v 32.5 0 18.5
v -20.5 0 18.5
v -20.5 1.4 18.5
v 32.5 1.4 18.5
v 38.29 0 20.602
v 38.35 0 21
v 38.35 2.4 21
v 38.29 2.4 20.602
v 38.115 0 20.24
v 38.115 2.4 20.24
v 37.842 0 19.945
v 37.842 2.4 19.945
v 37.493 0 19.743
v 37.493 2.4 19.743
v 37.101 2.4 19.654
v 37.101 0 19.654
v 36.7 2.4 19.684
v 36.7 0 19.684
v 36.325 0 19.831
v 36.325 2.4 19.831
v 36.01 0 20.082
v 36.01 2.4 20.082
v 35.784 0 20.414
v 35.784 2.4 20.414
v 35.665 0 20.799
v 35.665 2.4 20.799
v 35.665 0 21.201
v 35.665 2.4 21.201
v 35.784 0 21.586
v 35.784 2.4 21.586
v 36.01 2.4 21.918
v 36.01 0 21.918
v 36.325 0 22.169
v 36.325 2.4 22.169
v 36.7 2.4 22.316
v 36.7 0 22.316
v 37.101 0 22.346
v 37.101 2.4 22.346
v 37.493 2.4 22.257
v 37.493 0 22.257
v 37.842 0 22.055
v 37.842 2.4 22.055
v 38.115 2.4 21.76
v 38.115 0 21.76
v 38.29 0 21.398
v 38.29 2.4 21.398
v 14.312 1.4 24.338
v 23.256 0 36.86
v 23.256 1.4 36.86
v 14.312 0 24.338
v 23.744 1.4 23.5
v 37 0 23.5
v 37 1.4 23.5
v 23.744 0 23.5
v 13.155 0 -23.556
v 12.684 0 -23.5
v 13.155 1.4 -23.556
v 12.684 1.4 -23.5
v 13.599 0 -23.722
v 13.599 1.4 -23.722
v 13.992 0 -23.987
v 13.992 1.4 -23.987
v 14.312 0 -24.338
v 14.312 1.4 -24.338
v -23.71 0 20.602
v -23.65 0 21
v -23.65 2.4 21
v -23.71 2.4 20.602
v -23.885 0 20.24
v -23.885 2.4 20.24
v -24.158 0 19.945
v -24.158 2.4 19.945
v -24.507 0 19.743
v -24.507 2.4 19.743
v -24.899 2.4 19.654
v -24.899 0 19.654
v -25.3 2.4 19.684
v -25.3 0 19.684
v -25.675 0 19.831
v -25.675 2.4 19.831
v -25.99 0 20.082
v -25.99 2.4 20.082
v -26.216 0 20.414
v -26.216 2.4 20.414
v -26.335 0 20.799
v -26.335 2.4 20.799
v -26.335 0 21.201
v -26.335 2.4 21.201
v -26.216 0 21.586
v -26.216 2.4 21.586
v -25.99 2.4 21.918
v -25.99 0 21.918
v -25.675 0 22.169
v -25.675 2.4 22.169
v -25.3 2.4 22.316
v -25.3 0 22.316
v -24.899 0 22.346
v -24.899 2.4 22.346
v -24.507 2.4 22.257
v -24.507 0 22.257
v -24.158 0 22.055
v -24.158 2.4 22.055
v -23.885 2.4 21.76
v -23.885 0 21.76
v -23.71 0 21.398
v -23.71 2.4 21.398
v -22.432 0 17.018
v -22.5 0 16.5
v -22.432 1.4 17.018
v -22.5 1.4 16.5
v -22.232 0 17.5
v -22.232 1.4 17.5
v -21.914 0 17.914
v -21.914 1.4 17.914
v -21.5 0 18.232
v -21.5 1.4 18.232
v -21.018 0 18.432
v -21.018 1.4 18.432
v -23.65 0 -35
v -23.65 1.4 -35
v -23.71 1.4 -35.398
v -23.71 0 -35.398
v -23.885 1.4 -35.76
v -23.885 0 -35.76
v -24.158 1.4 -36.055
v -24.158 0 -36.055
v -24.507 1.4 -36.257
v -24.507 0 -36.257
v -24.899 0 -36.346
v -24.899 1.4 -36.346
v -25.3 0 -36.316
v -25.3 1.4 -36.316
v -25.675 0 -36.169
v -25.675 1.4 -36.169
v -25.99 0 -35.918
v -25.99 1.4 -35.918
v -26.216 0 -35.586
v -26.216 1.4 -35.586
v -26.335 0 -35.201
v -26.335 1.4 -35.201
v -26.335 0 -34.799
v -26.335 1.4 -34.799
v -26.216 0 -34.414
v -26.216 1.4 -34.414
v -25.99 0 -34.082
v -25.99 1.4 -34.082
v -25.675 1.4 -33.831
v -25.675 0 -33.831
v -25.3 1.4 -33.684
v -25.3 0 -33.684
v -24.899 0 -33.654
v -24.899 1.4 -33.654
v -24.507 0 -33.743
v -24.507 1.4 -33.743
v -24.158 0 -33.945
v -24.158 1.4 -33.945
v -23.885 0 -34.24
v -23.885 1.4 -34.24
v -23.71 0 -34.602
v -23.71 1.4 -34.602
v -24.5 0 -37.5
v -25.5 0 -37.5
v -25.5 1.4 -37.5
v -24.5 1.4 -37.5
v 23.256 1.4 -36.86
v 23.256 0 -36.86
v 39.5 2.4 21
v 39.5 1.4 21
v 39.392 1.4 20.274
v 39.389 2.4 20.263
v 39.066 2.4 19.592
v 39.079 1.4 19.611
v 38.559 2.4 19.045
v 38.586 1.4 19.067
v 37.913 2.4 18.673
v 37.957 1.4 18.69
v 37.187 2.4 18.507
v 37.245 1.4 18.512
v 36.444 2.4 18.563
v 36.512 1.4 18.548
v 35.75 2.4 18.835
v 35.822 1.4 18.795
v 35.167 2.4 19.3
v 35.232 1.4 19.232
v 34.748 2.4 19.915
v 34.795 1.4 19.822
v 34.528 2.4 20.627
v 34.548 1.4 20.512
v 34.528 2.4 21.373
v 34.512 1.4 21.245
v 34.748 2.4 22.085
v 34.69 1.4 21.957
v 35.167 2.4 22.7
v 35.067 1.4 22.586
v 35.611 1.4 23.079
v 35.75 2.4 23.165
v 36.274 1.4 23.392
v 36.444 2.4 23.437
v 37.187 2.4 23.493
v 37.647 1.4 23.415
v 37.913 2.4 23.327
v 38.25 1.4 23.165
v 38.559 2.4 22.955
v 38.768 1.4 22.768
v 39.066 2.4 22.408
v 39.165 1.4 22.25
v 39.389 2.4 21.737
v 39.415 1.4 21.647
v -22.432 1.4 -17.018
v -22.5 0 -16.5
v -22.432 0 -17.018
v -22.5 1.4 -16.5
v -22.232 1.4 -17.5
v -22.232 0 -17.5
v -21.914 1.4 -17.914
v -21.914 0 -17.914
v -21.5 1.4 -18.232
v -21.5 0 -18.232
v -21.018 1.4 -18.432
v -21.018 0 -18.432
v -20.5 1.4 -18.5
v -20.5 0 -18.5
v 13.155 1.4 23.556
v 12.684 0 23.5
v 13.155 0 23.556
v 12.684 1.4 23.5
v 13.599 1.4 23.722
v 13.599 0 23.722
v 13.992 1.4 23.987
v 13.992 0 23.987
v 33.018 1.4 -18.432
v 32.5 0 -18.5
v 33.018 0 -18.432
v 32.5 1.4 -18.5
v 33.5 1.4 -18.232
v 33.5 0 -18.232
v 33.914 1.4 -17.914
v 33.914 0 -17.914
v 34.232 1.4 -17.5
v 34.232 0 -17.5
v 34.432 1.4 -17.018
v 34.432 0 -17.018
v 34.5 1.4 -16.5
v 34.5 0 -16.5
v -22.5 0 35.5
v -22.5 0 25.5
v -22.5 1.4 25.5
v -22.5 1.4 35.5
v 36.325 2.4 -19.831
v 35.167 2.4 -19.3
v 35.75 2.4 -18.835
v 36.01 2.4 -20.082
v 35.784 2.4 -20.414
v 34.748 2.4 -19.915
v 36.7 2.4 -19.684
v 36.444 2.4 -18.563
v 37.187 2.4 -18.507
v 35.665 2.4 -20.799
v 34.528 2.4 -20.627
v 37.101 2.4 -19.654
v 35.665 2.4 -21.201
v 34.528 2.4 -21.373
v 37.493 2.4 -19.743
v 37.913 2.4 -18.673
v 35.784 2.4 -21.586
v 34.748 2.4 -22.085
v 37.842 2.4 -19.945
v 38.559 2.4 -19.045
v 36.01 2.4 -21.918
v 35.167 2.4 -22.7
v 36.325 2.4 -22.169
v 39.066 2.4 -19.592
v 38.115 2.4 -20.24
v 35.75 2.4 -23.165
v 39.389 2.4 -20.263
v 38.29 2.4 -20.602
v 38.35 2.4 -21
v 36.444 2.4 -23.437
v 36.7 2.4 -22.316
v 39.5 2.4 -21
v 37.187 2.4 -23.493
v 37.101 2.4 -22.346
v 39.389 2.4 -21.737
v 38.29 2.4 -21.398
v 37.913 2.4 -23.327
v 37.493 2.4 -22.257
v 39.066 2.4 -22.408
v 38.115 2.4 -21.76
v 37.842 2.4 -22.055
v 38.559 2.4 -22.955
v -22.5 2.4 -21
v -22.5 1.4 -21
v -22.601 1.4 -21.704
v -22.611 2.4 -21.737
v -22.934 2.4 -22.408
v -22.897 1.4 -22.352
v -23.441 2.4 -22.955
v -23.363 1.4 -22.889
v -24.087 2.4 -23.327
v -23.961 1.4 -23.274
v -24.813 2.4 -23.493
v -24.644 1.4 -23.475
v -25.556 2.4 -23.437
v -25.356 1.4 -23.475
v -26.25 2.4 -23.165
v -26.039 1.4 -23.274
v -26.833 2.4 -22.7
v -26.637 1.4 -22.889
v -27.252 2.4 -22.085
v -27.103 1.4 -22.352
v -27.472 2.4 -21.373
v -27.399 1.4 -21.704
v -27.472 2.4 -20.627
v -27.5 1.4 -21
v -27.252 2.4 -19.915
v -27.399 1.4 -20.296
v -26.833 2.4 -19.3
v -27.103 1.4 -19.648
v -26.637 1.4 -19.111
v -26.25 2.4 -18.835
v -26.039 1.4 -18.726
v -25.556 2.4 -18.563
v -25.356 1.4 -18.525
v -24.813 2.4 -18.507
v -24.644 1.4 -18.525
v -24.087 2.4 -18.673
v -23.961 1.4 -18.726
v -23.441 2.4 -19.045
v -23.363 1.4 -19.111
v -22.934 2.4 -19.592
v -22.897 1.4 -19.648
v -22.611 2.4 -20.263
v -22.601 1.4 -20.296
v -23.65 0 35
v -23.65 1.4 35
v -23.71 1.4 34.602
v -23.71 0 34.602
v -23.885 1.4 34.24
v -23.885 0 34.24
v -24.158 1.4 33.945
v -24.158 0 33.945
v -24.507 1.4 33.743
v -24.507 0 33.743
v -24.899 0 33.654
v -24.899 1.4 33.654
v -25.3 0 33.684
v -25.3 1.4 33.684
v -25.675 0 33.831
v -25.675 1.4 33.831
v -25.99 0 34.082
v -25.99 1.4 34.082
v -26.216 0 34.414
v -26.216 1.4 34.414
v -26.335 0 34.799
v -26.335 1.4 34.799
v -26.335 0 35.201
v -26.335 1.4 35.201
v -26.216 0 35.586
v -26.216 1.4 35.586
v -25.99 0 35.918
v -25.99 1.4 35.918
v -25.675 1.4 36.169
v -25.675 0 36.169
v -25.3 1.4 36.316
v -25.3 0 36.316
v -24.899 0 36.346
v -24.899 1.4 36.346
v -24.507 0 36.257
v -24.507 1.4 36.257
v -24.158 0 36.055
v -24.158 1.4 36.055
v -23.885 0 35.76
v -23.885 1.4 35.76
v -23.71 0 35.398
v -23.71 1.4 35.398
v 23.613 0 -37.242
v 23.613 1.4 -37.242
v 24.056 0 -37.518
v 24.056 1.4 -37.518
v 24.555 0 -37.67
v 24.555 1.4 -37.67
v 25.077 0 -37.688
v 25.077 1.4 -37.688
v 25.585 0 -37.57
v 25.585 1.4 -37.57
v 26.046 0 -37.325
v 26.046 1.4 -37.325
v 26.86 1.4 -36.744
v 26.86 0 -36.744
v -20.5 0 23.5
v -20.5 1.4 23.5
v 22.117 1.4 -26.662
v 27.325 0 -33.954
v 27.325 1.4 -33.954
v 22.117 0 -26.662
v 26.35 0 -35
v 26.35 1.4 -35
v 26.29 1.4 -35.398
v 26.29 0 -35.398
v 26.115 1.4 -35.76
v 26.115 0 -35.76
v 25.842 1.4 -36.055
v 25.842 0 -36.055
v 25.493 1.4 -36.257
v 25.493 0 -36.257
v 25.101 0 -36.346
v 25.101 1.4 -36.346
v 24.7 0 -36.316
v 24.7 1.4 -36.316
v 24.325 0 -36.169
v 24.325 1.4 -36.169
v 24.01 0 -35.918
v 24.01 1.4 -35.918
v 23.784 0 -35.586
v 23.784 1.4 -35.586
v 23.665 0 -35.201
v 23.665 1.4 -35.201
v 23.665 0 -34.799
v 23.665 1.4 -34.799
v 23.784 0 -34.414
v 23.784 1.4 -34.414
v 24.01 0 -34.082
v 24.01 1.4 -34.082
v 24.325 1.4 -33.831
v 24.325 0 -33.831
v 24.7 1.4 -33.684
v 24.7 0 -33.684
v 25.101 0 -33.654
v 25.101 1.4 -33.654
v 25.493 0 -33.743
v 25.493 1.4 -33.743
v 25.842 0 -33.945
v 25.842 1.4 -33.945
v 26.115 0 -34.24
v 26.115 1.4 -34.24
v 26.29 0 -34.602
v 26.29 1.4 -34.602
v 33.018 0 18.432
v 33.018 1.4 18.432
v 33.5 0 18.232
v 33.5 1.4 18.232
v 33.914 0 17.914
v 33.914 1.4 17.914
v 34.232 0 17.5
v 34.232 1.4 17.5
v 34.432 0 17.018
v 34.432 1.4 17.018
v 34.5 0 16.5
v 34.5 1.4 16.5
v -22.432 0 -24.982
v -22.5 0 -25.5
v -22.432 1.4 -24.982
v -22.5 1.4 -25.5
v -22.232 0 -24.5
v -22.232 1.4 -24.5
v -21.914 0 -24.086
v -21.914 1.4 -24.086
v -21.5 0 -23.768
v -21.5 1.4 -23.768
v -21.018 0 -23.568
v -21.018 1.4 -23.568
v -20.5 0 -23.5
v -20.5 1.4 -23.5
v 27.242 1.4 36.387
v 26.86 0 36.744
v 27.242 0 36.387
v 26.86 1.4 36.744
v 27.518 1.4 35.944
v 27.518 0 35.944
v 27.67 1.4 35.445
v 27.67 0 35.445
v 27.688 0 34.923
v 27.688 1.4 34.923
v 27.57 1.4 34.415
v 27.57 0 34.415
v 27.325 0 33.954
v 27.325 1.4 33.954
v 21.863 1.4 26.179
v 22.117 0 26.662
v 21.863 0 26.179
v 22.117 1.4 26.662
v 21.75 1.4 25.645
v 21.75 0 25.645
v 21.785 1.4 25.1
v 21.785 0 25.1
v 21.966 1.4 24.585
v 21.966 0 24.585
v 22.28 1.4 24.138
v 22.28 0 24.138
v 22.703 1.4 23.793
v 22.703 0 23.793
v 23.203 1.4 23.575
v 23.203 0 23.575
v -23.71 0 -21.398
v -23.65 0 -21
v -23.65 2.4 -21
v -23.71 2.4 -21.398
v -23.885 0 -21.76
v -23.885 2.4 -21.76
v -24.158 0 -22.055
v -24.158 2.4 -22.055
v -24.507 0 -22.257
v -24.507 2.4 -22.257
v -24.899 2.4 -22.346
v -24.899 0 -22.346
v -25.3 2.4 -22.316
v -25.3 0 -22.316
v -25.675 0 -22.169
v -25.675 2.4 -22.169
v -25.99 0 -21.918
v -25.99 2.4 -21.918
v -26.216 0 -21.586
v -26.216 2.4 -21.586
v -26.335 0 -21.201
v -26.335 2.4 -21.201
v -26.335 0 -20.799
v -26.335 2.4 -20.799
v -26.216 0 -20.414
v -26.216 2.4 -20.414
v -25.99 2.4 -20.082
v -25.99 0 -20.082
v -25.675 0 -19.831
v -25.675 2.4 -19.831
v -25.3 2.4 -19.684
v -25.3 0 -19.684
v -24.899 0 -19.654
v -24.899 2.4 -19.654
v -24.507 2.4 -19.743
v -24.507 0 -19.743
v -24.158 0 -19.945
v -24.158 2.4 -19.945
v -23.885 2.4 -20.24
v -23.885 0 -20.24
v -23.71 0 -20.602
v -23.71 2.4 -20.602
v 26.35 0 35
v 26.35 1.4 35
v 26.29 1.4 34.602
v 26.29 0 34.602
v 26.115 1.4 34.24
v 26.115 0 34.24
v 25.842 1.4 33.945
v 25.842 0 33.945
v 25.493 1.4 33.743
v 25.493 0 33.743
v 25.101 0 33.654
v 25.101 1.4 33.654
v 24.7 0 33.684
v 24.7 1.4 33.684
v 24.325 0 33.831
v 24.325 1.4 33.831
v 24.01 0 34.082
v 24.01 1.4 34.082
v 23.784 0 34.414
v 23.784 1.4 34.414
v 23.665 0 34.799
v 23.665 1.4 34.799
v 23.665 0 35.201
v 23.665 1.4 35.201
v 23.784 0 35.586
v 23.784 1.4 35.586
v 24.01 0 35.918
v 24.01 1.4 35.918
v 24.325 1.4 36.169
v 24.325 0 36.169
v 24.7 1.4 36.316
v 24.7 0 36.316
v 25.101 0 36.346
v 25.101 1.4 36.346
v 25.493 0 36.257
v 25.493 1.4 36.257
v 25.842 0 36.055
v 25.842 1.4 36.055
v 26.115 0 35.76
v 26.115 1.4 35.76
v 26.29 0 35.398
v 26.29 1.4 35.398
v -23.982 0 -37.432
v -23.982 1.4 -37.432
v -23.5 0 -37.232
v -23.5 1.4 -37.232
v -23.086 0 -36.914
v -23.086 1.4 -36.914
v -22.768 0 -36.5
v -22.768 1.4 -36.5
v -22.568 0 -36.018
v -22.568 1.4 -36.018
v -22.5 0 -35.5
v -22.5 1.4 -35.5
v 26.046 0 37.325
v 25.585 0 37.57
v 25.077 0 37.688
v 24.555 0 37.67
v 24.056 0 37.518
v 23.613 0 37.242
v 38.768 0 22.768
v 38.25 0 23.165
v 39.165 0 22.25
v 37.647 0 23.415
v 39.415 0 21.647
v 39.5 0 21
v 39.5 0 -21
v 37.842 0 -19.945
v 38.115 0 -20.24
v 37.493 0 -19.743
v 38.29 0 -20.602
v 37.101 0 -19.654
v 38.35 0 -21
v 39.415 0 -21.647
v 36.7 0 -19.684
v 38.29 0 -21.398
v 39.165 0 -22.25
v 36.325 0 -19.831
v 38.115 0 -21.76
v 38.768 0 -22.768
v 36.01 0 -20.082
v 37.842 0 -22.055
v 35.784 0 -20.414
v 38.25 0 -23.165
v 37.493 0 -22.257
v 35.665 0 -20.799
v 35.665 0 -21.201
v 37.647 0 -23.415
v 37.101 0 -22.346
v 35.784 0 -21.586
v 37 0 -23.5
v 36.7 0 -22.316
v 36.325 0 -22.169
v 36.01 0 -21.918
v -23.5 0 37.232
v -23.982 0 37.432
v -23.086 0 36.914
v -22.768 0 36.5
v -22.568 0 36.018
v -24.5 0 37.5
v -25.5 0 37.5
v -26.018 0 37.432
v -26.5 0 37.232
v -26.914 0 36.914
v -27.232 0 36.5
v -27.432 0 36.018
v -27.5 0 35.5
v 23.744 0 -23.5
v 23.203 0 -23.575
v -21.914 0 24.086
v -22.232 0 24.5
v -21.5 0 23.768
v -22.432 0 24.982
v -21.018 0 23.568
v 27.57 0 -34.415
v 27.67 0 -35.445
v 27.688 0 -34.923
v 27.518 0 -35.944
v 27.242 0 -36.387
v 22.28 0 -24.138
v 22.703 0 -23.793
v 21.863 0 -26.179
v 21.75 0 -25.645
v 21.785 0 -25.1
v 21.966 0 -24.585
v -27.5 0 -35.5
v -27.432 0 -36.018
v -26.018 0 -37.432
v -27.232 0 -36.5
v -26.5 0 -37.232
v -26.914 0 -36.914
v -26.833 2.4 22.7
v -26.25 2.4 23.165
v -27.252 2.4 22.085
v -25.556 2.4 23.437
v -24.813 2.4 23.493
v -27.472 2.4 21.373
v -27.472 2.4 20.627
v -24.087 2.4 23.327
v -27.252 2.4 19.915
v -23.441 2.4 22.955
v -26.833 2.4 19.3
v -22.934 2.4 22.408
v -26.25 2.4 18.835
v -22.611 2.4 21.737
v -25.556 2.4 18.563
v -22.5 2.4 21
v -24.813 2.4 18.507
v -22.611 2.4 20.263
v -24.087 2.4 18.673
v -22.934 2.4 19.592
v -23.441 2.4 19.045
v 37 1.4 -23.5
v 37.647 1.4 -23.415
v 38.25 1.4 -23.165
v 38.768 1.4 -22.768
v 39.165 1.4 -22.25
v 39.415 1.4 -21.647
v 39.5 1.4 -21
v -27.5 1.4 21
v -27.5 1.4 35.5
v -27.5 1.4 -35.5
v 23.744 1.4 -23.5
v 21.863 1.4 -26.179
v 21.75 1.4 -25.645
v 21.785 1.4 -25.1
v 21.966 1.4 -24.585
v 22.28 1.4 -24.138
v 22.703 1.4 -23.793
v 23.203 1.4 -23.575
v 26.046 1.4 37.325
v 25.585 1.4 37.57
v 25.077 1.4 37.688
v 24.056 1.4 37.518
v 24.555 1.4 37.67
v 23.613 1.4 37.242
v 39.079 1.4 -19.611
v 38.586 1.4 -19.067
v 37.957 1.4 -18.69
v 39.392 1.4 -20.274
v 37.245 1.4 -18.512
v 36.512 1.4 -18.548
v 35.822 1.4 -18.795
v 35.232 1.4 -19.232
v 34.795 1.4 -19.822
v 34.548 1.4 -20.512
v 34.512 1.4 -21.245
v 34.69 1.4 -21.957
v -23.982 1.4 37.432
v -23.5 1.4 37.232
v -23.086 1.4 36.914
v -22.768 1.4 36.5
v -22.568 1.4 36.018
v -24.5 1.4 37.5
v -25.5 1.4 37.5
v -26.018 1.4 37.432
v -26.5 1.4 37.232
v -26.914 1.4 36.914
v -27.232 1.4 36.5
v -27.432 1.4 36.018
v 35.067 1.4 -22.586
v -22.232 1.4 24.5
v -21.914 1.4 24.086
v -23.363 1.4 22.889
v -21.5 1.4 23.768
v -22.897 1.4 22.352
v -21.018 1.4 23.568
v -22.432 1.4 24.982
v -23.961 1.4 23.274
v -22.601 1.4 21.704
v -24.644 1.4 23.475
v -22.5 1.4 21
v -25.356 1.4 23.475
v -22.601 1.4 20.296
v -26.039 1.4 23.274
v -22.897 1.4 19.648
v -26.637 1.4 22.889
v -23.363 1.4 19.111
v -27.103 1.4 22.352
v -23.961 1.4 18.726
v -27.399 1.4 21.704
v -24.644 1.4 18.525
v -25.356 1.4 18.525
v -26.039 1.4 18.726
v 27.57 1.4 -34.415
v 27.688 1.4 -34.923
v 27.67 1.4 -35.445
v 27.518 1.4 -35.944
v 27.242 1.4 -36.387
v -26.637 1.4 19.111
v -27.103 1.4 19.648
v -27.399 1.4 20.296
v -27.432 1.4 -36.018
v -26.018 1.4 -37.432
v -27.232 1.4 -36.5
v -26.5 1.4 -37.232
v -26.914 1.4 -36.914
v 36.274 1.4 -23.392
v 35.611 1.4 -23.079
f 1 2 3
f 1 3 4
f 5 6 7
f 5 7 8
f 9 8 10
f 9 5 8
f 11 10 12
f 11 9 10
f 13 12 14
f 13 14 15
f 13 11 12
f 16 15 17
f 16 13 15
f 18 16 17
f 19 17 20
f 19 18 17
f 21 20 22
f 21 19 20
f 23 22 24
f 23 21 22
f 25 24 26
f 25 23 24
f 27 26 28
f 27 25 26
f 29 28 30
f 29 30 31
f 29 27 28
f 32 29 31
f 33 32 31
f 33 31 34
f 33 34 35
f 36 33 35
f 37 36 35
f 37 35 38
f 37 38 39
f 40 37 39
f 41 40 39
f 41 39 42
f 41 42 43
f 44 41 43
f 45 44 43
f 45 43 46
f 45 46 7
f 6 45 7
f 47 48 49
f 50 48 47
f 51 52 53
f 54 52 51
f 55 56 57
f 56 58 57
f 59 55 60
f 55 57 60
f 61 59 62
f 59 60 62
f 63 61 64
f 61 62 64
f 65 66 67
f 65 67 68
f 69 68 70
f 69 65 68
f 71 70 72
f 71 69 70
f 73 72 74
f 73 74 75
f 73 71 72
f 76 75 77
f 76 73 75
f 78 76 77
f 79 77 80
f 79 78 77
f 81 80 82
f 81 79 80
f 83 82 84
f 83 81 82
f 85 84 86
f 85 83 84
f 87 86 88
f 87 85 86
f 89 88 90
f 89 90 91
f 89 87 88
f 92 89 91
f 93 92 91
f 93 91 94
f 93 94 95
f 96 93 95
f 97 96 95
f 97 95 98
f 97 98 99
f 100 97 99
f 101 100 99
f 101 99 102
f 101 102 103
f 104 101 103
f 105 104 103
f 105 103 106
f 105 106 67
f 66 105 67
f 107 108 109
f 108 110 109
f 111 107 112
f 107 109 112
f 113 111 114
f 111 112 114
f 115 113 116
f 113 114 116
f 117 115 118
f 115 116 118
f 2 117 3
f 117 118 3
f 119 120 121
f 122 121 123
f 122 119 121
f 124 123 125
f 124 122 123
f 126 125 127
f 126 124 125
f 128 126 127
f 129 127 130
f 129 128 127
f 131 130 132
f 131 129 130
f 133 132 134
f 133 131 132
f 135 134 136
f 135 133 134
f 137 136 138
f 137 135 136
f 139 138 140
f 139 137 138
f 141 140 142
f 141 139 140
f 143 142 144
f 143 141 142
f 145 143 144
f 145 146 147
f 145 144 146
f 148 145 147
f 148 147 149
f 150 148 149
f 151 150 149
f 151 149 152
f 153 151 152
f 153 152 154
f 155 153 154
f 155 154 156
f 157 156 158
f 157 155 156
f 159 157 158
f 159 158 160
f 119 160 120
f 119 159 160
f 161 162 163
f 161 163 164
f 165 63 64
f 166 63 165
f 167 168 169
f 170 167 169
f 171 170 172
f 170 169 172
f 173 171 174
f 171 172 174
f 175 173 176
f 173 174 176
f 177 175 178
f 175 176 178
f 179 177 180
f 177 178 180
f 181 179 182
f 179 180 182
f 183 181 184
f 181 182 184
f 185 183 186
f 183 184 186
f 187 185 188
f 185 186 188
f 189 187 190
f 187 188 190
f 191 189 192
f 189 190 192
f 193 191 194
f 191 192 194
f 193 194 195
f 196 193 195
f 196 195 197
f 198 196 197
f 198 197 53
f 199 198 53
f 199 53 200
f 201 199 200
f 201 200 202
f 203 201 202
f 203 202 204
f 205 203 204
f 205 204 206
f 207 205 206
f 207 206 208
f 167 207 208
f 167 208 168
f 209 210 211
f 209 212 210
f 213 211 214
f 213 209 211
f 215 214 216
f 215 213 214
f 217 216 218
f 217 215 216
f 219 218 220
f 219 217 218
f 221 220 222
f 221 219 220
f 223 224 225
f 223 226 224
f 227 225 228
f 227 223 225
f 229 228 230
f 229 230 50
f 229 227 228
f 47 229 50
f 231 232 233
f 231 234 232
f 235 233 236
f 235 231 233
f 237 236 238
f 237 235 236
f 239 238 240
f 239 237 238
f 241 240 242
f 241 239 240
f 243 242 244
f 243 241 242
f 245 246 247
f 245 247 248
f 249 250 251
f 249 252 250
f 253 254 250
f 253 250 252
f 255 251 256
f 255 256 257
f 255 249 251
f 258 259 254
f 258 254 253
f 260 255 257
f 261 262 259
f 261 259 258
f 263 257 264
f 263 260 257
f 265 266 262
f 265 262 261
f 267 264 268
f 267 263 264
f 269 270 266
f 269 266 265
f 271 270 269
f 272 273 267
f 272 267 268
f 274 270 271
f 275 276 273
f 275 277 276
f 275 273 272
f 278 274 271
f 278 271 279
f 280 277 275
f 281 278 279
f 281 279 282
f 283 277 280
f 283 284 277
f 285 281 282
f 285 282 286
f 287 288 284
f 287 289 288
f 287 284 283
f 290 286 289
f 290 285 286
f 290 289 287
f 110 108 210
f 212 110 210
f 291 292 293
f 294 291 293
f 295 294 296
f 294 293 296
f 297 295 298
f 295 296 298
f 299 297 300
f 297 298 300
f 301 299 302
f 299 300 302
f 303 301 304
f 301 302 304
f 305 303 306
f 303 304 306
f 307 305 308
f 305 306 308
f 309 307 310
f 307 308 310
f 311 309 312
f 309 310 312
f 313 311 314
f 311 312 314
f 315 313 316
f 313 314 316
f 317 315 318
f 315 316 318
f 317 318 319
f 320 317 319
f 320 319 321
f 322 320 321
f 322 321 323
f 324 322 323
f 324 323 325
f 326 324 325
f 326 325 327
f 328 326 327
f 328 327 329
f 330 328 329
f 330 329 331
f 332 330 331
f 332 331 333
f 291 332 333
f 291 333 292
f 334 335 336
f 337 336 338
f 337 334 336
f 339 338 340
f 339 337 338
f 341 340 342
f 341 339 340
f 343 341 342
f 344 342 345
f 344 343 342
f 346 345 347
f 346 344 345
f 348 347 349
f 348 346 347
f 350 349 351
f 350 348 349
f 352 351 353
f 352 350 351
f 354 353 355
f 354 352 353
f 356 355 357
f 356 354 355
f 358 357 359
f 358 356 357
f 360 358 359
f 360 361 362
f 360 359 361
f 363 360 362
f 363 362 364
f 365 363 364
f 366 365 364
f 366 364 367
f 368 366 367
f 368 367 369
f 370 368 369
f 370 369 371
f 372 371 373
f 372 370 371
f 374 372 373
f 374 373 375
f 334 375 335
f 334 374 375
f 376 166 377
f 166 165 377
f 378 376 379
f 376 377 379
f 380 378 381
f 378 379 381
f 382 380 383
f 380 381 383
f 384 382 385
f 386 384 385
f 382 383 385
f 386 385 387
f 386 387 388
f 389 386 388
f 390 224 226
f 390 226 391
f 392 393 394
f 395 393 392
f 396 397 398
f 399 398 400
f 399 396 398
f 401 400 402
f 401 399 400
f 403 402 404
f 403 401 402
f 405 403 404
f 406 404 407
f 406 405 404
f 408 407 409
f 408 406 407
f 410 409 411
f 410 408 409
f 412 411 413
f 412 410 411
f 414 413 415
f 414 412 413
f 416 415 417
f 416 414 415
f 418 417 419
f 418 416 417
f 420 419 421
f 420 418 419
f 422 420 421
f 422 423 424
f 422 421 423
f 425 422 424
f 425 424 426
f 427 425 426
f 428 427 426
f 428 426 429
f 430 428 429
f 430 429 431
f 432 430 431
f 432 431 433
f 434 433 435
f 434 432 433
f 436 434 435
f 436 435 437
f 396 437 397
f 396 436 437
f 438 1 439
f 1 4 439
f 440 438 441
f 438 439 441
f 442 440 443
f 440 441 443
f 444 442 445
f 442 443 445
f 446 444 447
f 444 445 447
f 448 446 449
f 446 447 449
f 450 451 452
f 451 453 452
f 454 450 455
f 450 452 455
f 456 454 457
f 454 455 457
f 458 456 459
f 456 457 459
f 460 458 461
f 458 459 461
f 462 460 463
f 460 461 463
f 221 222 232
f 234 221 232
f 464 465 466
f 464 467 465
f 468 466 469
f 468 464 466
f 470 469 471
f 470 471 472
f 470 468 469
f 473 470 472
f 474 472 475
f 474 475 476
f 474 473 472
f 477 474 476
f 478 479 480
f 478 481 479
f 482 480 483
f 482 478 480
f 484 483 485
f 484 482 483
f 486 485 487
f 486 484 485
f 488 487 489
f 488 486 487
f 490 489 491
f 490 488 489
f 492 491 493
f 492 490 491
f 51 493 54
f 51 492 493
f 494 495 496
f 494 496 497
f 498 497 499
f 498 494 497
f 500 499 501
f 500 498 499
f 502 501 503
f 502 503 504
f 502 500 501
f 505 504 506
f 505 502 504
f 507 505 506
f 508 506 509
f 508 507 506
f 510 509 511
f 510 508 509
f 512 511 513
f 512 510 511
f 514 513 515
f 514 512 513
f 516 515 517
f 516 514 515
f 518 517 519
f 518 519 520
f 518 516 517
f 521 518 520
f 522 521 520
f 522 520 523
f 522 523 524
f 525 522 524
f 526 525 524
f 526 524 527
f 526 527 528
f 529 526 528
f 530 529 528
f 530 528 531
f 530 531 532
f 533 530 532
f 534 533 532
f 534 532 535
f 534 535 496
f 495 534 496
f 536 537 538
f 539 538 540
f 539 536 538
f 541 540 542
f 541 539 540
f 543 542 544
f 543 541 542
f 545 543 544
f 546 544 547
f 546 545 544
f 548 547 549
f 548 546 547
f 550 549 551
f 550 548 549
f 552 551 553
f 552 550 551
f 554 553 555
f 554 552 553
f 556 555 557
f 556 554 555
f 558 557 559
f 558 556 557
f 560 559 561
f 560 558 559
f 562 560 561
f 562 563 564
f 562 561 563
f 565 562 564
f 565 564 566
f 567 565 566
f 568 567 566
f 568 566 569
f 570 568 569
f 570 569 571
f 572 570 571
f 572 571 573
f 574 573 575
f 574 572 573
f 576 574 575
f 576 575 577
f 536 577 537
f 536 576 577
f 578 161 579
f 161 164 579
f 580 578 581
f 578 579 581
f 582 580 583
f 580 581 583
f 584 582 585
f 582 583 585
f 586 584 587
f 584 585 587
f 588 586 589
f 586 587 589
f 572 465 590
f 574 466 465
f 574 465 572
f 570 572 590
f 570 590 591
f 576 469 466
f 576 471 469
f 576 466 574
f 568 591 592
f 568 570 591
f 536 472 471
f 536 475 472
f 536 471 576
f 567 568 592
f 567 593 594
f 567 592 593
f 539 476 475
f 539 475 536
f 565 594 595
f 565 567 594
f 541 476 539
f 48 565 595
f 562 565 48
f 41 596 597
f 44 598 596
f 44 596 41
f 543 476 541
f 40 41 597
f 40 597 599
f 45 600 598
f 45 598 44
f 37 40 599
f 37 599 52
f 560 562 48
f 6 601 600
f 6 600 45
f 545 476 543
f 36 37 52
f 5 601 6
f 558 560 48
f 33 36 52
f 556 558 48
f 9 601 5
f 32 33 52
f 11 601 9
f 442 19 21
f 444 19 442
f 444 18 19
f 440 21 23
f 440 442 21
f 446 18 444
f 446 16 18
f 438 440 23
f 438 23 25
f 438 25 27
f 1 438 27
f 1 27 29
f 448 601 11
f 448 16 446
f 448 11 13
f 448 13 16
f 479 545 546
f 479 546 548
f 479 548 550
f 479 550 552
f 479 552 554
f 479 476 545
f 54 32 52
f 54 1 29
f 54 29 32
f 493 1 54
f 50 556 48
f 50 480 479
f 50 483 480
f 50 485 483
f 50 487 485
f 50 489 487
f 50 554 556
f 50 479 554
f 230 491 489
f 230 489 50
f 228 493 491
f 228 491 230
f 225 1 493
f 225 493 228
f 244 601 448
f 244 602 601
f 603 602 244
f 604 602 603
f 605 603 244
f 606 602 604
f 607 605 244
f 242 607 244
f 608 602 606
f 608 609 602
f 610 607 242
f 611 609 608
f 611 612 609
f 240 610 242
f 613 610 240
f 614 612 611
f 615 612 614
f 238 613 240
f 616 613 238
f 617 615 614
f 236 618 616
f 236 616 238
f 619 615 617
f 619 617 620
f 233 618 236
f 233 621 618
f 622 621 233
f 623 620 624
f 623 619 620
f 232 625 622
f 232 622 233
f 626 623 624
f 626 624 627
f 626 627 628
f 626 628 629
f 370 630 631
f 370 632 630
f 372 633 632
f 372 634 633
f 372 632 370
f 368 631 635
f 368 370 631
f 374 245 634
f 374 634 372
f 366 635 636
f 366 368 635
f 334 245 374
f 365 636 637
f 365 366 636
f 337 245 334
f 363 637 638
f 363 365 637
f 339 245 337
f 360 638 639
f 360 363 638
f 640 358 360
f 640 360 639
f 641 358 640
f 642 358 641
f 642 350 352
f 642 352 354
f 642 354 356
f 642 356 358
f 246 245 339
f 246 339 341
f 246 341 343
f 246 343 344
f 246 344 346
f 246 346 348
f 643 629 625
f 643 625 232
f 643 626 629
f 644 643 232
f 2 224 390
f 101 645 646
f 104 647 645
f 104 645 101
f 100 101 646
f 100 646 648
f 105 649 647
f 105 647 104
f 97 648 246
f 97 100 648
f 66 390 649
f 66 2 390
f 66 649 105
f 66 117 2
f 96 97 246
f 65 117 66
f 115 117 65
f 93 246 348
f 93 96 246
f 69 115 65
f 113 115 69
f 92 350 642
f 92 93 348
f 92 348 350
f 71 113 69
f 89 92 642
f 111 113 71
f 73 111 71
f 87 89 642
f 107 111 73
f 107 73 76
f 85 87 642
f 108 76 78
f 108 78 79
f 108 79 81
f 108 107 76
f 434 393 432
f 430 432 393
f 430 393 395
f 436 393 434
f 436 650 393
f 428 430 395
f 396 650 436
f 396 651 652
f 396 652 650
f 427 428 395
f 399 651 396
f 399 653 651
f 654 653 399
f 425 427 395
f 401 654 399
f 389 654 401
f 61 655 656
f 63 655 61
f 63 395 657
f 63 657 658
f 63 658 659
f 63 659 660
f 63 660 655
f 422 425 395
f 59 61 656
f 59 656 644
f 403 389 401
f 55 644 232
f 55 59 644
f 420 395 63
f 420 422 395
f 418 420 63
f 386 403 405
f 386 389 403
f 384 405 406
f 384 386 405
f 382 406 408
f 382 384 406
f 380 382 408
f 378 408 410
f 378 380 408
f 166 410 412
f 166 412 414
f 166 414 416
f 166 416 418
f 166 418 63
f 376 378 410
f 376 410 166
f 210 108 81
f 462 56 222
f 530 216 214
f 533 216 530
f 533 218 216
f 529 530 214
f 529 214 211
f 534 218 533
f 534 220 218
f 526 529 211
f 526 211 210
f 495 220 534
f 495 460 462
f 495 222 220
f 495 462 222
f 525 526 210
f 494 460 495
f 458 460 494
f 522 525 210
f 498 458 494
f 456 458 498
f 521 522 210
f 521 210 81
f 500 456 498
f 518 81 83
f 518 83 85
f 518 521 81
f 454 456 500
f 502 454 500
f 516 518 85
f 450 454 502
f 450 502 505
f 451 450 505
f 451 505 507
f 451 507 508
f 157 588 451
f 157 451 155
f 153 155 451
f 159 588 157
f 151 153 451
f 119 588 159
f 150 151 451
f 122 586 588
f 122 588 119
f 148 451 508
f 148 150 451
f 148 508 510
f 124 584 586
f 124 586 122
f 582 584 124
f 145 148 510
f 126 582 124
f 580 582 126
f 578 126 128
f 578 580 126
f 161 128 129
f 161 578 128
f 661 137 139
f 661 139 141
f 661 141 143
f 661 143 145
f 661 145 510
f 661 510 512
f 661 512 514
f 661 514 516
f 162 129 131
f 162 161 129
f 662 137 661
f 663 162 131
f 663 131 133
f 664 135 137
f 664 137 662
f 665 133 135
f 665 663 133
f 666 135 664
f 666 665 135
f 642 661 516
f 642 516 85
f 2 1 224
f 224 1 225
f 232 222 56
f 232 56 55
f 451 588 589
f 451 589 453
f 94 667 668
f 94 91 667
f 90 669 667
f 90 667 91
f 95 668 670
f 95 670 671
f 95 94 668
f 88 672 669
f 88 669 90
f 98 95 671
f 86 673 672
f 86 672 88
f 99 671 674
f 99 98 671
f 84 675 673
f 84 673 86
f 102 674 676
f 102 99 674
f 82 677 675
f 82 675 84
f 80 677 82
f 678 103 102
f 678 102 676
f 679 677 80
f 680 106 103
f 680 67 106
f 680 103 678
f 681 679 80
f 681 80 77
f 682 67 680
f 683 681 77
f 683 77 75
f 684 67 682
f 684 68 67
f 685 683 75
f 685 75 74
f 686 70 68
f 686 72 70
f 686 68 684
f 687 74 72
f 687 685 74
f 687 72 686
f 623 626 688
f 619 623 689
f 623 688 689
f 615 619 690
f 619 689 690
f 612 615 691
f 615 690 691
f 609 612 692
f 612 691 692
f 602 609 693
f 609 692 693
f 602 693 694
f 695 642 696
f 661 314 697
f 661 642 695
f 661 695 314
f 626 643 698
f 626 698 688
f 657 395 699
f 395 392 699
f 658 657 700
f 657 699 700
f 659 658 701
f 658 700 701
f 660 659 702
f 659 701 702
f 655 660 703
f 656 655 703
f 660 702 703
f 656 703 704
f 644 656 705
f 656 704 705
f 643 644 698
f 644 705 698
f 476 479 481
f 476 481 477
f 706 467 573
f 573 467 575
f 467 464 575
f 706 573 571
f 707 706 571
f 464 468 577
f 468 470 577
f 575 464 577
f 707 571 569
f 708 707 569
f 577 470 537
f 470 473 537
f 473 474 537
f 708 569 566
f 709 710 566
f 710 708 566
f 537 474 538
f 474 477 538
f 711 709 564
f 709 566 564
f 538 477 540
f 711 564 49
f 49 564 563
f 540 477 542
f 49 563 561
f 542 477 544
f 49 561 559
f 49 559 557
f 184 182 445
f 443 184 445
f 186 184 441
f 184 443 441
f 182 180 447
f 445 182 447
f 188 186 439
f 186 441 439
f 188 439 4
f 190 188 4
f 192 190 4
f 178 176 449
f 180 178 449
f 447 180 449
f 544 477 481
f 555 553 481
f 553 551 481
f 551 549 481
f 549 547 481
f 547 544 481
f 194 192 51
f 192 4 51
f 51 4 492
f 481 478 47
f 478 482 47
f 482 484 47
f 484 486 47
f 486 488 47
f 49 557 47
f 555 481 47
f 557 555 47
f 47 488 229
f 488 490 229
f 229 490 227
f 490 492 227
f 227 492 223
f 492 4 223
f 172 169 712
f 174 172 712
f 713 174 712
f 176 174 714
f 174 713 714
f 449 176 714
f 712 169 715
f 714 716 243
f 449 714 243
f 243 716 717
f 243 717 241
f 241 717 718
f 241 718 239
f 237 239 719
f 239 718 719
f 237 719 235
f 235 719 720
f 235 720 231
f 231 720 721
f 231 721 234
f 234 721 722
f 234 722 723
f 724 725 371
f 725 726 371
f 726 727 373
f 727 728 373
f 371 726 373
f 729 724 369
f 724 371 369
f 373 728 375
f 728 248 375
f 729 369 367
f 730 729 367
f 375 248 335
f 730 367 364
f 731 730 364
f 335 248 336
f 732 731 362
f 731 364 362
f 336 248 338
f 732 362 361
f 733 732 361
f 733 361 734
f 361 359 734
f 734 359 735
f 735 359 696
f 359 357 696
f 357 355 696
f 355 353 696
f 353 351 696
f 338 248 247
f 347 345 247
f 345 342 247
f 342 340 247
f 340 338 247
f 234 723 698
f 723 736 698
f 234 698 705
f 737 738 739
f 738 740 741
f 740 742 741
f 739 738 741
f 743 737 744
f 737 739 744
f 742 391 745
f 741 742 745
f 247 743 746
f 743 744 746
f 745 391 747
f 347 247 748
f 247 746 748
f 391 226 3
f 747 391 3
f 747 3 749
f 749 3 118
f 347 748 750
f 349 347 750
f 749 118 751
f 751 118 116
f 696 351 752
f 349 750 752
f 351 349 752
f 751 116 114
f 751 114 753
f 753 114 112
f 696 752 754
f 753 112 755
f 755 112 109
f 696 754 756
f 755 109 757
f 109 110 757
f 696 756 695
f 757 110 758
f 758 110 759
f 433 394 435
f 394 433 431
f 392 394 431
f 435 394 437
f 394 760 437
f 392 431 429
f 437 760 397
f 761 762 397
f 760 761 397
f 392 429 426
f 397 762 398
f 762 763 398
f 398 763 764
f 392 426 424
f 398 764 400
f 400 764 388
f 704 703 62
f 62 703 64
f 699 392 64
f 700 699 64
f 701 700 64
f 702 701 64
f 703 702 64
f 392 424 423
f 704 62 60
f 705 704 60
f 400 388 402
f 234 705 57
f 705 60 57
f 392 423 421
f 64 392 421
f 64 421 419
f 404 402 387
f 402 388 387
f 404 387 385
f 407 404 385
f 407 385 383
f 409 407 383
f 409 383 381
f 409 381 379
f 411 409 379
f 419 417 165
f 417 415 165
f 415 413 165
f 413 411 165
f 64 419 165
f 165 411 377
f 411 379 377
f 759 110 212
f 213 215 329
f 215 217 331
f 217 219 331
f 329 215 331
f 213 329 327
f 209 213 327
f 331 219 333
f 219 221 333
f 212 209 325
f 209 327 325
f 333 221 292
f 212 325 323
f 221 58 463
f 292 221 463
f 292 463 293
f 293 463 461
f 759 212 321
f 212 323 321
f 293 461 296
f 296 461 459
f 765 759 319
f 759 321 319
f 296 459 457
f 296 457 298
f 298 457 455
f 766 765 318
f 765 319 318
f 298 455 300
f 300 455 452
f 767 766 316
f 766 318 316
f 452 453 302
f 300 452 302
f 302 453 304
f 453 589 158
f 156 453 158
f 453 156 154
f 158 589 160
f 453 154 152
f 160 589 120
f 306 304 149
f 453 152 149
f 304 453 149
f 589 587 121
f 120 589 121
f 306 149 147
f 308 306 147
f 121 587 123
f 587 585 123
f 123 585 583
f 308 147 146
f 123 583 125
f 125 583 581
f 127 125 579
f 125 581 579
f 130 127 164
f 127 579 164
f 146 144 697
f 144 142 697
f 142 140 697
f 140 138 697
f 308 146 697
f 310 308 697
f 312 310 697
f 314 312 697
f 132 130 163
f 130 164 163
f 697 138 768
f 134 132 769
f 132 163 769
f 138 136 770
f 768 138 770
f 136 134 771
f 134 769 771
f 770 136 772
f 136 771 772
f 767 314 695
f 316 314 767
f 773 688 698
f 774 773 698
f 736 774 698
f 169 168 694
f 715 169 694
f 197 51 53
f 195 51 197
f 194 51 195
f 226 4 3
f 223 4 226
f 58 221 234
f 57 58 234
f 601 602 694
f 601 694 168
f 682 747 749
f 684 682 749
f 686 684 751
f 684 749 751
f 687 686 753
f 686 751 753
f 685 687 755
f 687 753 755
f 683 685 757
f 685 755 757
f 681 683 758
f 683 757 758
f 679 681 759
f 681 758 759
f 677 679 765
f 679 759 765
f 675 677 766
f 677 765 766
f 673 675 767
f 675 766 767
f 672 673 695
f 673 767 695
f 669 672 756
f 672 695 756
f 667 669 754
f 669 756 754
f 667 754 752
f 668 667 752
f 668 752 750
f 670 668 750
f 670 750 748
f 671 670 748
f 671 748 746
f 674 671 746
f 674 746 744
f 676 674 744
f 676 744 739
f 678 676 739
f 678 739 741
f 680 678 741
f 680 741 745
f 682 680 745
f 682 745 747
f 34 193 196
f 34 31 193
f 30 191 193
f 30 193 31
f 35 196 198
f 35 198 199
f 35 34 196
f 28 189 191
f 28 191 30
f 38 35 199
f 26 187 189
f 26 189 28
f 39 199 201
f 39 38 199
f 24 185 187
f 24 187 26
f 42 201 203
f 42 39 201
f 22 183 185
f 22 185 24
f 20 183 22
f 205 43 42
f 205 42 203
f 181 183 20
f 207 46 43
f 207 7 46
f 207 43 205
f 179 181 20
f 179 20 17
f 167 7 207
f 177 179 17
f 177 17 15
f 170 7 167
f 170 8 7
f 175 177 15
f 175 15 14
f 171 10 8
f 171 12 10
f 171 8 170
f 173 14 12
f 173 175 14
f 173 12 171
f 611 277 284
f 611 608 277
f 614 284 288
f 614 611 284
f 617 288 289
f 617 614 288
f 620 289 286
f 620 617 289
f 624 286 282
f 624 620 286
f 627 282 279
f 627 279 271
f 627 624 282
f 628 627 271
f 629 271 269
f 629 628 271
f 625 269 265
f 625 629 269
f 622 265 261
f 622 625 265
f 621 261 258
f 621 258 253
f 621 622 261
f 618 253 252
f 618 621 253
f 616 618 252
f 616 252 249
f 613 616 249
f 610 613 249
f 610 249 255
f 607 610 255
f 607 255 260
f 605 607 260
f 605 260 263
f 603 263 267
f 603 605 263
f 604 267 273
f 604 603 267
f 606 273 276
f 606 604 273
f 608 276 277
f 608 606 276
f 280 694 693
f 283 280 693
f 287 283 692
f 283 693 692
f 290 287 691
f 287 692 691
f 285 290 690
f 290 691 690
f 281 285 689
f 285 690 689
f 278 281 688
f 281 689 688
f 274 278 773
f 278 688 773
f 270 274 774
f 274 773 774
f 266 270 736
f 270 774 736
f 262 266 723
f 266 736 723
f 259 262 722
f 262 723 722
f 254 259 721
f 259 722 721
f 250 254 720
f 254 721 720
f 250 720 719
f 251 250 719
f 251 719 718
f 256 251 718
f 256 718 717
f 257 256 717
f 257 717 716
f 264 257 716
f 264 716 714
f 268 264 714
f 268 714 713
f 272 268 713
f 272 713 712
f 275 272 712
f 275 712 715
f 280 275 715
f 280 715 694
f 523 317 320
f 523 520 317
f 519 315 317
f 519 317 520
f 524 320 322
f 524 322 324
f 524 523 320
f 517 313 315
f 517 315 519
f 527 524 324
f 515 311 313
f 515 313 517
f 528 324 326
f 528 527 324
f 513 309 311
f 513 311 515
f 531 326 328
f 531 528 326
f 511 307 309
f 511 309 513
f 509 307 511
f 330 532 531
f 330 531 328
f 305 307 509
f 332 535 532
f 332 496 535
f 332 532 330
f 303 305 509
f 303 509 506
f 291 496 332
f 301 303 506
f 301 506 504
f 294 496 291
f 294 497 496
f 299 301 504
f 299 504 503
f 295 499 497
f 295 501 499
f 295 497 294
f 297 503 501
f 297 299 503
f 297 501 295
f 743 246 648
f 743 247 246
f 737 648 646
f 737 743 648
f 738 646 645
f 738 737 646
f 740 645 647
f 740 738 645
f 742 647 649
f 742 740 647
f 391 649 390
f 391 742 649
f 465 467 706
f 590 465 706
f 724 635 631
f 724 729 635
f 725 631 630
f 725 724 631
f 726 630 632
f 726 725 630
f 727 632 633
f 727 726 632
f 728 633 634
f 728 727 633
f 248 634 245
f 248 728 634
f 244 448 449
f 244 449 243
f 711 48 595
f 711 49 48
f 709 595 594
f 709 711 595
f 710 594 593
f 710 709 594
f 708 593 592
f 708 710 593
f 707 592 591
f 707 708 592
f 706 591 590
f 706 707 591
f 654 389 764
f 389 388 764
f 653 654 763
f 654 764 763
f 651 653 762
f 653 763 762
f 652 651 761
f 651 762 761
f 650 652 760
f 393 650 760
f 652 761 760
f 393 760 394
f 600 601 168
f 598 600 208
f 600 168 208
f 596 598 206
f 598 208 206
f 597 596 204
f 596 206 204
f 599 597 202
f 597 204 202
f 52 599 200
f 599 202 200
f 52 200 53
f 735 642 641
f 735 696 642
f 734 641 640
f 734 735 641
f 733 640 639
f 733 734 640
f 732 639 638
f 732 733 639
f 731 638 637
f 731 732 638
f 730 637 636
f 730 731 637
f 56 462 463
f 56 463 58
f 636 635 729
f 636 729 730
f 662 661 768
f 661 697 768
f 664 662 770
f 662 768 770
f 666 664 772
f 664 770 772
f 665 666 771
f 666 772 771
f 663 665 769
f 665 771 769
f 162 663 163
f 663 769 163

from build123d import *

# Parameters (mm, degrees)
SKETCH2_W           = 57
SKETCH2_H           = 37
BOSS_EXTRUDE1_DEPTH = 1.4
SKETCH1_R           = 1.35
CUT_EXTRUDE2_DEPTH  = 2.4
FILLET1_R           = 2
FILLET2_R           = 2
SKETCH4_R           = 2.5
SKETCH4_R_2         = 1.35
BOSS_EXTRUDE2_DEPTH = 1
CUT_EXTRUDE3_DEPTH  = 2.4


with BuildPart() as part:
    # Sketch2 → Boss-Extrude1 (new body)
    with BuildSketch(Plane(origin=(0, 0, 0), x_dir=(1, 0, 0), z_dir=(0, 1, 0))):
        Polygon((-27.5, -37.5), (-27.5, 37.5), (-22.5, 37.5), (-22.5, 23.5), (13.713455262, 23.5), (24.418761806, 38.487429162), (28.487429162, 35.581238194), (19.85797331, 23.5), (39.5, 23.5), (39.5, -23.5), (19.85797331, -23.5), (28.487429162, -35.581238194), (24.418761806, -38.487429162), (13.713455262, -23.5), (-22.5, -23.5), (-22.5, -37.5), align=None)
        with Locations((6, 0)):
            Rectangle(SKETCH2_W, SKETCH2_H, mode=Mode.SUBTRACT)
    extrude(amount=BOSS_EXTRUDE1_DEPTH)

    # Sketch1 → Cut-Extrude2 (cut, through all)
    with BuildSketch(Plane(origin=(0, 0, 0), x_dir=(1, 0, 0), z_dir=(0, 1, 0))):
        with Locations((-25, 35)):
            Circle(SKETCH1_R)
        with Locations((25, 35)):
            Circle(SKETCH1_R)
        with Locations((25, -35)):
            Circle(SKETCH1_R)
        with Locations((-25, -35)):
            Circle(SKETCH1_R)
        with Locations((-25, 21)):
            Circle(SKETCH1_R)
        with Locations((37, 21)):
            Circle(SKETCH1_R)
        with Locations((37, -21)):
            Circle(SKETCH1_R)
        with Locations((-25, -21)):
            Circle(SKETCH1_R)
    extrude(amount=CUT_EXTRUDE2_DEPTH, mode=Mode.SUBTRACT)

    # Fillet1
    fillet1_edges = [part.edges().sort_by_distance(p)[0] for p in [
        (28.487429162, 0.7, 35.581238194),
        (24.418761806, 0.7, 38.487429162),
        (-22.5, 0.7, 37.5),
        (-27.5, 0.7, 37.5),
        (-27.5, 0.7, -37.5),
        (-22.5, 0.7, -37.5),
        (24.418761806, 0.7, -38.487429162),
        (28.487429162, 0.7, -35.581238194),
    ]]
    fillet(fillet1_edges, radius=FILLET1_R)

    # Fillet2
    fillet2_edges = [part.edges().sort_by_distance(p)[0] for p in [
        (13.713455262, 0.7, 23.5),
        (-22.5, 0.7, 23.5),
        (-22.5, 0.7, -23.5),
        (13.713455262, 0.7, -23.5),
        (19.85797331, 0.7, -23.5),
        (19.85797331, 0.7, 23.5),
        (-22.5, 0.7, 18.5),
        (34.5, 0.7, 18.5),
        (34.5, 0.7, -18.5),
        (-22.5, 0.7, -18.5),
    ]]
    fillet(fillet2_edges, radius=FILLET2_R)

    # Sketch4 → Boss-Extrude2 (add)
    with BuildSketch(Plane(origin=(0, 1.4, 0), x_dir=(1, 0, 0), z_dir=(0, 1, 0))):
        with Locations((37, 21)):
            Circle(SKETCH4_R)
        with Locations((37, 21)):
            Circle(SKETCH4_R_2, mode=Mode.SUBTRACT)
        with Locations((37, -21)):
            Circle(SKETCH4_R)
        with Locations((37, -21)):
            Circle(SKETCH4_R_2, mode=Mode.SUBTRACT)
        with Locations((-25, -21)):
            Circle(SKETCH4_R)
        with Locations((-25, -21)):
            Circle(SKETCH4_R_2, mode=Mode.SUBTRACT)
        with Locations((-25, 21)):
            Circle(SKETCH4_R)
        with Locations((-25, 21)):
            Circle(SKETCH4_R_2, mode=Mode.SUBTRACT)
    extrude(amount=BOSS_EXTRUDE2_DEPTH)

    # Sketch5 → Cut-Extrude3 (cut, through all)
    with BuildSketch(Plane(origin=(0, 1.4, 0), x_dir=(1, 0, 0), z_dir=(0, 1, 0))):
        with BuildLine():
            Line((37, -23.5), (39.5, -23.5))
            Line((39.5, -23.5), (39.5, -21))
            ThreePointArc((39.5, -21), (38.767766953, -22.767766953), (37, -23.5))
        make_face()
        with BuildLine():
            Line((39.5, 21), (39.5, 23.5))
            Line((39.5, 23.5), (37, 23.5))
            ThreePointArc((37, 23.5), (38.767766953, 22.767766953), (39.5, 21))
        make_face()
    extrude(amount=-CUT_EXTRUDE3_DEPTH, mode=Mode.SUBTRACT)


solid = part.part
